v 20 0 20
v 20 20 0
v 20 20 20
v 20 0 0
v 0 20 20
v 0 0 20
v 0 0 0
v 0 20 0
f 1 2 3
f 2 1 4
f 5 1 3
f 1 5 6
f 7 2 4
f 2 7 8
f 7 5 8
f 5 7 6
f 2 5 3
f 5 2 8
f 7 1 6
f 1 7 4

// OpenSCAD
$fn = 50;

difference() {
	union() {
		cube(size = [20, 20, 20]);
	}
	union();
}
